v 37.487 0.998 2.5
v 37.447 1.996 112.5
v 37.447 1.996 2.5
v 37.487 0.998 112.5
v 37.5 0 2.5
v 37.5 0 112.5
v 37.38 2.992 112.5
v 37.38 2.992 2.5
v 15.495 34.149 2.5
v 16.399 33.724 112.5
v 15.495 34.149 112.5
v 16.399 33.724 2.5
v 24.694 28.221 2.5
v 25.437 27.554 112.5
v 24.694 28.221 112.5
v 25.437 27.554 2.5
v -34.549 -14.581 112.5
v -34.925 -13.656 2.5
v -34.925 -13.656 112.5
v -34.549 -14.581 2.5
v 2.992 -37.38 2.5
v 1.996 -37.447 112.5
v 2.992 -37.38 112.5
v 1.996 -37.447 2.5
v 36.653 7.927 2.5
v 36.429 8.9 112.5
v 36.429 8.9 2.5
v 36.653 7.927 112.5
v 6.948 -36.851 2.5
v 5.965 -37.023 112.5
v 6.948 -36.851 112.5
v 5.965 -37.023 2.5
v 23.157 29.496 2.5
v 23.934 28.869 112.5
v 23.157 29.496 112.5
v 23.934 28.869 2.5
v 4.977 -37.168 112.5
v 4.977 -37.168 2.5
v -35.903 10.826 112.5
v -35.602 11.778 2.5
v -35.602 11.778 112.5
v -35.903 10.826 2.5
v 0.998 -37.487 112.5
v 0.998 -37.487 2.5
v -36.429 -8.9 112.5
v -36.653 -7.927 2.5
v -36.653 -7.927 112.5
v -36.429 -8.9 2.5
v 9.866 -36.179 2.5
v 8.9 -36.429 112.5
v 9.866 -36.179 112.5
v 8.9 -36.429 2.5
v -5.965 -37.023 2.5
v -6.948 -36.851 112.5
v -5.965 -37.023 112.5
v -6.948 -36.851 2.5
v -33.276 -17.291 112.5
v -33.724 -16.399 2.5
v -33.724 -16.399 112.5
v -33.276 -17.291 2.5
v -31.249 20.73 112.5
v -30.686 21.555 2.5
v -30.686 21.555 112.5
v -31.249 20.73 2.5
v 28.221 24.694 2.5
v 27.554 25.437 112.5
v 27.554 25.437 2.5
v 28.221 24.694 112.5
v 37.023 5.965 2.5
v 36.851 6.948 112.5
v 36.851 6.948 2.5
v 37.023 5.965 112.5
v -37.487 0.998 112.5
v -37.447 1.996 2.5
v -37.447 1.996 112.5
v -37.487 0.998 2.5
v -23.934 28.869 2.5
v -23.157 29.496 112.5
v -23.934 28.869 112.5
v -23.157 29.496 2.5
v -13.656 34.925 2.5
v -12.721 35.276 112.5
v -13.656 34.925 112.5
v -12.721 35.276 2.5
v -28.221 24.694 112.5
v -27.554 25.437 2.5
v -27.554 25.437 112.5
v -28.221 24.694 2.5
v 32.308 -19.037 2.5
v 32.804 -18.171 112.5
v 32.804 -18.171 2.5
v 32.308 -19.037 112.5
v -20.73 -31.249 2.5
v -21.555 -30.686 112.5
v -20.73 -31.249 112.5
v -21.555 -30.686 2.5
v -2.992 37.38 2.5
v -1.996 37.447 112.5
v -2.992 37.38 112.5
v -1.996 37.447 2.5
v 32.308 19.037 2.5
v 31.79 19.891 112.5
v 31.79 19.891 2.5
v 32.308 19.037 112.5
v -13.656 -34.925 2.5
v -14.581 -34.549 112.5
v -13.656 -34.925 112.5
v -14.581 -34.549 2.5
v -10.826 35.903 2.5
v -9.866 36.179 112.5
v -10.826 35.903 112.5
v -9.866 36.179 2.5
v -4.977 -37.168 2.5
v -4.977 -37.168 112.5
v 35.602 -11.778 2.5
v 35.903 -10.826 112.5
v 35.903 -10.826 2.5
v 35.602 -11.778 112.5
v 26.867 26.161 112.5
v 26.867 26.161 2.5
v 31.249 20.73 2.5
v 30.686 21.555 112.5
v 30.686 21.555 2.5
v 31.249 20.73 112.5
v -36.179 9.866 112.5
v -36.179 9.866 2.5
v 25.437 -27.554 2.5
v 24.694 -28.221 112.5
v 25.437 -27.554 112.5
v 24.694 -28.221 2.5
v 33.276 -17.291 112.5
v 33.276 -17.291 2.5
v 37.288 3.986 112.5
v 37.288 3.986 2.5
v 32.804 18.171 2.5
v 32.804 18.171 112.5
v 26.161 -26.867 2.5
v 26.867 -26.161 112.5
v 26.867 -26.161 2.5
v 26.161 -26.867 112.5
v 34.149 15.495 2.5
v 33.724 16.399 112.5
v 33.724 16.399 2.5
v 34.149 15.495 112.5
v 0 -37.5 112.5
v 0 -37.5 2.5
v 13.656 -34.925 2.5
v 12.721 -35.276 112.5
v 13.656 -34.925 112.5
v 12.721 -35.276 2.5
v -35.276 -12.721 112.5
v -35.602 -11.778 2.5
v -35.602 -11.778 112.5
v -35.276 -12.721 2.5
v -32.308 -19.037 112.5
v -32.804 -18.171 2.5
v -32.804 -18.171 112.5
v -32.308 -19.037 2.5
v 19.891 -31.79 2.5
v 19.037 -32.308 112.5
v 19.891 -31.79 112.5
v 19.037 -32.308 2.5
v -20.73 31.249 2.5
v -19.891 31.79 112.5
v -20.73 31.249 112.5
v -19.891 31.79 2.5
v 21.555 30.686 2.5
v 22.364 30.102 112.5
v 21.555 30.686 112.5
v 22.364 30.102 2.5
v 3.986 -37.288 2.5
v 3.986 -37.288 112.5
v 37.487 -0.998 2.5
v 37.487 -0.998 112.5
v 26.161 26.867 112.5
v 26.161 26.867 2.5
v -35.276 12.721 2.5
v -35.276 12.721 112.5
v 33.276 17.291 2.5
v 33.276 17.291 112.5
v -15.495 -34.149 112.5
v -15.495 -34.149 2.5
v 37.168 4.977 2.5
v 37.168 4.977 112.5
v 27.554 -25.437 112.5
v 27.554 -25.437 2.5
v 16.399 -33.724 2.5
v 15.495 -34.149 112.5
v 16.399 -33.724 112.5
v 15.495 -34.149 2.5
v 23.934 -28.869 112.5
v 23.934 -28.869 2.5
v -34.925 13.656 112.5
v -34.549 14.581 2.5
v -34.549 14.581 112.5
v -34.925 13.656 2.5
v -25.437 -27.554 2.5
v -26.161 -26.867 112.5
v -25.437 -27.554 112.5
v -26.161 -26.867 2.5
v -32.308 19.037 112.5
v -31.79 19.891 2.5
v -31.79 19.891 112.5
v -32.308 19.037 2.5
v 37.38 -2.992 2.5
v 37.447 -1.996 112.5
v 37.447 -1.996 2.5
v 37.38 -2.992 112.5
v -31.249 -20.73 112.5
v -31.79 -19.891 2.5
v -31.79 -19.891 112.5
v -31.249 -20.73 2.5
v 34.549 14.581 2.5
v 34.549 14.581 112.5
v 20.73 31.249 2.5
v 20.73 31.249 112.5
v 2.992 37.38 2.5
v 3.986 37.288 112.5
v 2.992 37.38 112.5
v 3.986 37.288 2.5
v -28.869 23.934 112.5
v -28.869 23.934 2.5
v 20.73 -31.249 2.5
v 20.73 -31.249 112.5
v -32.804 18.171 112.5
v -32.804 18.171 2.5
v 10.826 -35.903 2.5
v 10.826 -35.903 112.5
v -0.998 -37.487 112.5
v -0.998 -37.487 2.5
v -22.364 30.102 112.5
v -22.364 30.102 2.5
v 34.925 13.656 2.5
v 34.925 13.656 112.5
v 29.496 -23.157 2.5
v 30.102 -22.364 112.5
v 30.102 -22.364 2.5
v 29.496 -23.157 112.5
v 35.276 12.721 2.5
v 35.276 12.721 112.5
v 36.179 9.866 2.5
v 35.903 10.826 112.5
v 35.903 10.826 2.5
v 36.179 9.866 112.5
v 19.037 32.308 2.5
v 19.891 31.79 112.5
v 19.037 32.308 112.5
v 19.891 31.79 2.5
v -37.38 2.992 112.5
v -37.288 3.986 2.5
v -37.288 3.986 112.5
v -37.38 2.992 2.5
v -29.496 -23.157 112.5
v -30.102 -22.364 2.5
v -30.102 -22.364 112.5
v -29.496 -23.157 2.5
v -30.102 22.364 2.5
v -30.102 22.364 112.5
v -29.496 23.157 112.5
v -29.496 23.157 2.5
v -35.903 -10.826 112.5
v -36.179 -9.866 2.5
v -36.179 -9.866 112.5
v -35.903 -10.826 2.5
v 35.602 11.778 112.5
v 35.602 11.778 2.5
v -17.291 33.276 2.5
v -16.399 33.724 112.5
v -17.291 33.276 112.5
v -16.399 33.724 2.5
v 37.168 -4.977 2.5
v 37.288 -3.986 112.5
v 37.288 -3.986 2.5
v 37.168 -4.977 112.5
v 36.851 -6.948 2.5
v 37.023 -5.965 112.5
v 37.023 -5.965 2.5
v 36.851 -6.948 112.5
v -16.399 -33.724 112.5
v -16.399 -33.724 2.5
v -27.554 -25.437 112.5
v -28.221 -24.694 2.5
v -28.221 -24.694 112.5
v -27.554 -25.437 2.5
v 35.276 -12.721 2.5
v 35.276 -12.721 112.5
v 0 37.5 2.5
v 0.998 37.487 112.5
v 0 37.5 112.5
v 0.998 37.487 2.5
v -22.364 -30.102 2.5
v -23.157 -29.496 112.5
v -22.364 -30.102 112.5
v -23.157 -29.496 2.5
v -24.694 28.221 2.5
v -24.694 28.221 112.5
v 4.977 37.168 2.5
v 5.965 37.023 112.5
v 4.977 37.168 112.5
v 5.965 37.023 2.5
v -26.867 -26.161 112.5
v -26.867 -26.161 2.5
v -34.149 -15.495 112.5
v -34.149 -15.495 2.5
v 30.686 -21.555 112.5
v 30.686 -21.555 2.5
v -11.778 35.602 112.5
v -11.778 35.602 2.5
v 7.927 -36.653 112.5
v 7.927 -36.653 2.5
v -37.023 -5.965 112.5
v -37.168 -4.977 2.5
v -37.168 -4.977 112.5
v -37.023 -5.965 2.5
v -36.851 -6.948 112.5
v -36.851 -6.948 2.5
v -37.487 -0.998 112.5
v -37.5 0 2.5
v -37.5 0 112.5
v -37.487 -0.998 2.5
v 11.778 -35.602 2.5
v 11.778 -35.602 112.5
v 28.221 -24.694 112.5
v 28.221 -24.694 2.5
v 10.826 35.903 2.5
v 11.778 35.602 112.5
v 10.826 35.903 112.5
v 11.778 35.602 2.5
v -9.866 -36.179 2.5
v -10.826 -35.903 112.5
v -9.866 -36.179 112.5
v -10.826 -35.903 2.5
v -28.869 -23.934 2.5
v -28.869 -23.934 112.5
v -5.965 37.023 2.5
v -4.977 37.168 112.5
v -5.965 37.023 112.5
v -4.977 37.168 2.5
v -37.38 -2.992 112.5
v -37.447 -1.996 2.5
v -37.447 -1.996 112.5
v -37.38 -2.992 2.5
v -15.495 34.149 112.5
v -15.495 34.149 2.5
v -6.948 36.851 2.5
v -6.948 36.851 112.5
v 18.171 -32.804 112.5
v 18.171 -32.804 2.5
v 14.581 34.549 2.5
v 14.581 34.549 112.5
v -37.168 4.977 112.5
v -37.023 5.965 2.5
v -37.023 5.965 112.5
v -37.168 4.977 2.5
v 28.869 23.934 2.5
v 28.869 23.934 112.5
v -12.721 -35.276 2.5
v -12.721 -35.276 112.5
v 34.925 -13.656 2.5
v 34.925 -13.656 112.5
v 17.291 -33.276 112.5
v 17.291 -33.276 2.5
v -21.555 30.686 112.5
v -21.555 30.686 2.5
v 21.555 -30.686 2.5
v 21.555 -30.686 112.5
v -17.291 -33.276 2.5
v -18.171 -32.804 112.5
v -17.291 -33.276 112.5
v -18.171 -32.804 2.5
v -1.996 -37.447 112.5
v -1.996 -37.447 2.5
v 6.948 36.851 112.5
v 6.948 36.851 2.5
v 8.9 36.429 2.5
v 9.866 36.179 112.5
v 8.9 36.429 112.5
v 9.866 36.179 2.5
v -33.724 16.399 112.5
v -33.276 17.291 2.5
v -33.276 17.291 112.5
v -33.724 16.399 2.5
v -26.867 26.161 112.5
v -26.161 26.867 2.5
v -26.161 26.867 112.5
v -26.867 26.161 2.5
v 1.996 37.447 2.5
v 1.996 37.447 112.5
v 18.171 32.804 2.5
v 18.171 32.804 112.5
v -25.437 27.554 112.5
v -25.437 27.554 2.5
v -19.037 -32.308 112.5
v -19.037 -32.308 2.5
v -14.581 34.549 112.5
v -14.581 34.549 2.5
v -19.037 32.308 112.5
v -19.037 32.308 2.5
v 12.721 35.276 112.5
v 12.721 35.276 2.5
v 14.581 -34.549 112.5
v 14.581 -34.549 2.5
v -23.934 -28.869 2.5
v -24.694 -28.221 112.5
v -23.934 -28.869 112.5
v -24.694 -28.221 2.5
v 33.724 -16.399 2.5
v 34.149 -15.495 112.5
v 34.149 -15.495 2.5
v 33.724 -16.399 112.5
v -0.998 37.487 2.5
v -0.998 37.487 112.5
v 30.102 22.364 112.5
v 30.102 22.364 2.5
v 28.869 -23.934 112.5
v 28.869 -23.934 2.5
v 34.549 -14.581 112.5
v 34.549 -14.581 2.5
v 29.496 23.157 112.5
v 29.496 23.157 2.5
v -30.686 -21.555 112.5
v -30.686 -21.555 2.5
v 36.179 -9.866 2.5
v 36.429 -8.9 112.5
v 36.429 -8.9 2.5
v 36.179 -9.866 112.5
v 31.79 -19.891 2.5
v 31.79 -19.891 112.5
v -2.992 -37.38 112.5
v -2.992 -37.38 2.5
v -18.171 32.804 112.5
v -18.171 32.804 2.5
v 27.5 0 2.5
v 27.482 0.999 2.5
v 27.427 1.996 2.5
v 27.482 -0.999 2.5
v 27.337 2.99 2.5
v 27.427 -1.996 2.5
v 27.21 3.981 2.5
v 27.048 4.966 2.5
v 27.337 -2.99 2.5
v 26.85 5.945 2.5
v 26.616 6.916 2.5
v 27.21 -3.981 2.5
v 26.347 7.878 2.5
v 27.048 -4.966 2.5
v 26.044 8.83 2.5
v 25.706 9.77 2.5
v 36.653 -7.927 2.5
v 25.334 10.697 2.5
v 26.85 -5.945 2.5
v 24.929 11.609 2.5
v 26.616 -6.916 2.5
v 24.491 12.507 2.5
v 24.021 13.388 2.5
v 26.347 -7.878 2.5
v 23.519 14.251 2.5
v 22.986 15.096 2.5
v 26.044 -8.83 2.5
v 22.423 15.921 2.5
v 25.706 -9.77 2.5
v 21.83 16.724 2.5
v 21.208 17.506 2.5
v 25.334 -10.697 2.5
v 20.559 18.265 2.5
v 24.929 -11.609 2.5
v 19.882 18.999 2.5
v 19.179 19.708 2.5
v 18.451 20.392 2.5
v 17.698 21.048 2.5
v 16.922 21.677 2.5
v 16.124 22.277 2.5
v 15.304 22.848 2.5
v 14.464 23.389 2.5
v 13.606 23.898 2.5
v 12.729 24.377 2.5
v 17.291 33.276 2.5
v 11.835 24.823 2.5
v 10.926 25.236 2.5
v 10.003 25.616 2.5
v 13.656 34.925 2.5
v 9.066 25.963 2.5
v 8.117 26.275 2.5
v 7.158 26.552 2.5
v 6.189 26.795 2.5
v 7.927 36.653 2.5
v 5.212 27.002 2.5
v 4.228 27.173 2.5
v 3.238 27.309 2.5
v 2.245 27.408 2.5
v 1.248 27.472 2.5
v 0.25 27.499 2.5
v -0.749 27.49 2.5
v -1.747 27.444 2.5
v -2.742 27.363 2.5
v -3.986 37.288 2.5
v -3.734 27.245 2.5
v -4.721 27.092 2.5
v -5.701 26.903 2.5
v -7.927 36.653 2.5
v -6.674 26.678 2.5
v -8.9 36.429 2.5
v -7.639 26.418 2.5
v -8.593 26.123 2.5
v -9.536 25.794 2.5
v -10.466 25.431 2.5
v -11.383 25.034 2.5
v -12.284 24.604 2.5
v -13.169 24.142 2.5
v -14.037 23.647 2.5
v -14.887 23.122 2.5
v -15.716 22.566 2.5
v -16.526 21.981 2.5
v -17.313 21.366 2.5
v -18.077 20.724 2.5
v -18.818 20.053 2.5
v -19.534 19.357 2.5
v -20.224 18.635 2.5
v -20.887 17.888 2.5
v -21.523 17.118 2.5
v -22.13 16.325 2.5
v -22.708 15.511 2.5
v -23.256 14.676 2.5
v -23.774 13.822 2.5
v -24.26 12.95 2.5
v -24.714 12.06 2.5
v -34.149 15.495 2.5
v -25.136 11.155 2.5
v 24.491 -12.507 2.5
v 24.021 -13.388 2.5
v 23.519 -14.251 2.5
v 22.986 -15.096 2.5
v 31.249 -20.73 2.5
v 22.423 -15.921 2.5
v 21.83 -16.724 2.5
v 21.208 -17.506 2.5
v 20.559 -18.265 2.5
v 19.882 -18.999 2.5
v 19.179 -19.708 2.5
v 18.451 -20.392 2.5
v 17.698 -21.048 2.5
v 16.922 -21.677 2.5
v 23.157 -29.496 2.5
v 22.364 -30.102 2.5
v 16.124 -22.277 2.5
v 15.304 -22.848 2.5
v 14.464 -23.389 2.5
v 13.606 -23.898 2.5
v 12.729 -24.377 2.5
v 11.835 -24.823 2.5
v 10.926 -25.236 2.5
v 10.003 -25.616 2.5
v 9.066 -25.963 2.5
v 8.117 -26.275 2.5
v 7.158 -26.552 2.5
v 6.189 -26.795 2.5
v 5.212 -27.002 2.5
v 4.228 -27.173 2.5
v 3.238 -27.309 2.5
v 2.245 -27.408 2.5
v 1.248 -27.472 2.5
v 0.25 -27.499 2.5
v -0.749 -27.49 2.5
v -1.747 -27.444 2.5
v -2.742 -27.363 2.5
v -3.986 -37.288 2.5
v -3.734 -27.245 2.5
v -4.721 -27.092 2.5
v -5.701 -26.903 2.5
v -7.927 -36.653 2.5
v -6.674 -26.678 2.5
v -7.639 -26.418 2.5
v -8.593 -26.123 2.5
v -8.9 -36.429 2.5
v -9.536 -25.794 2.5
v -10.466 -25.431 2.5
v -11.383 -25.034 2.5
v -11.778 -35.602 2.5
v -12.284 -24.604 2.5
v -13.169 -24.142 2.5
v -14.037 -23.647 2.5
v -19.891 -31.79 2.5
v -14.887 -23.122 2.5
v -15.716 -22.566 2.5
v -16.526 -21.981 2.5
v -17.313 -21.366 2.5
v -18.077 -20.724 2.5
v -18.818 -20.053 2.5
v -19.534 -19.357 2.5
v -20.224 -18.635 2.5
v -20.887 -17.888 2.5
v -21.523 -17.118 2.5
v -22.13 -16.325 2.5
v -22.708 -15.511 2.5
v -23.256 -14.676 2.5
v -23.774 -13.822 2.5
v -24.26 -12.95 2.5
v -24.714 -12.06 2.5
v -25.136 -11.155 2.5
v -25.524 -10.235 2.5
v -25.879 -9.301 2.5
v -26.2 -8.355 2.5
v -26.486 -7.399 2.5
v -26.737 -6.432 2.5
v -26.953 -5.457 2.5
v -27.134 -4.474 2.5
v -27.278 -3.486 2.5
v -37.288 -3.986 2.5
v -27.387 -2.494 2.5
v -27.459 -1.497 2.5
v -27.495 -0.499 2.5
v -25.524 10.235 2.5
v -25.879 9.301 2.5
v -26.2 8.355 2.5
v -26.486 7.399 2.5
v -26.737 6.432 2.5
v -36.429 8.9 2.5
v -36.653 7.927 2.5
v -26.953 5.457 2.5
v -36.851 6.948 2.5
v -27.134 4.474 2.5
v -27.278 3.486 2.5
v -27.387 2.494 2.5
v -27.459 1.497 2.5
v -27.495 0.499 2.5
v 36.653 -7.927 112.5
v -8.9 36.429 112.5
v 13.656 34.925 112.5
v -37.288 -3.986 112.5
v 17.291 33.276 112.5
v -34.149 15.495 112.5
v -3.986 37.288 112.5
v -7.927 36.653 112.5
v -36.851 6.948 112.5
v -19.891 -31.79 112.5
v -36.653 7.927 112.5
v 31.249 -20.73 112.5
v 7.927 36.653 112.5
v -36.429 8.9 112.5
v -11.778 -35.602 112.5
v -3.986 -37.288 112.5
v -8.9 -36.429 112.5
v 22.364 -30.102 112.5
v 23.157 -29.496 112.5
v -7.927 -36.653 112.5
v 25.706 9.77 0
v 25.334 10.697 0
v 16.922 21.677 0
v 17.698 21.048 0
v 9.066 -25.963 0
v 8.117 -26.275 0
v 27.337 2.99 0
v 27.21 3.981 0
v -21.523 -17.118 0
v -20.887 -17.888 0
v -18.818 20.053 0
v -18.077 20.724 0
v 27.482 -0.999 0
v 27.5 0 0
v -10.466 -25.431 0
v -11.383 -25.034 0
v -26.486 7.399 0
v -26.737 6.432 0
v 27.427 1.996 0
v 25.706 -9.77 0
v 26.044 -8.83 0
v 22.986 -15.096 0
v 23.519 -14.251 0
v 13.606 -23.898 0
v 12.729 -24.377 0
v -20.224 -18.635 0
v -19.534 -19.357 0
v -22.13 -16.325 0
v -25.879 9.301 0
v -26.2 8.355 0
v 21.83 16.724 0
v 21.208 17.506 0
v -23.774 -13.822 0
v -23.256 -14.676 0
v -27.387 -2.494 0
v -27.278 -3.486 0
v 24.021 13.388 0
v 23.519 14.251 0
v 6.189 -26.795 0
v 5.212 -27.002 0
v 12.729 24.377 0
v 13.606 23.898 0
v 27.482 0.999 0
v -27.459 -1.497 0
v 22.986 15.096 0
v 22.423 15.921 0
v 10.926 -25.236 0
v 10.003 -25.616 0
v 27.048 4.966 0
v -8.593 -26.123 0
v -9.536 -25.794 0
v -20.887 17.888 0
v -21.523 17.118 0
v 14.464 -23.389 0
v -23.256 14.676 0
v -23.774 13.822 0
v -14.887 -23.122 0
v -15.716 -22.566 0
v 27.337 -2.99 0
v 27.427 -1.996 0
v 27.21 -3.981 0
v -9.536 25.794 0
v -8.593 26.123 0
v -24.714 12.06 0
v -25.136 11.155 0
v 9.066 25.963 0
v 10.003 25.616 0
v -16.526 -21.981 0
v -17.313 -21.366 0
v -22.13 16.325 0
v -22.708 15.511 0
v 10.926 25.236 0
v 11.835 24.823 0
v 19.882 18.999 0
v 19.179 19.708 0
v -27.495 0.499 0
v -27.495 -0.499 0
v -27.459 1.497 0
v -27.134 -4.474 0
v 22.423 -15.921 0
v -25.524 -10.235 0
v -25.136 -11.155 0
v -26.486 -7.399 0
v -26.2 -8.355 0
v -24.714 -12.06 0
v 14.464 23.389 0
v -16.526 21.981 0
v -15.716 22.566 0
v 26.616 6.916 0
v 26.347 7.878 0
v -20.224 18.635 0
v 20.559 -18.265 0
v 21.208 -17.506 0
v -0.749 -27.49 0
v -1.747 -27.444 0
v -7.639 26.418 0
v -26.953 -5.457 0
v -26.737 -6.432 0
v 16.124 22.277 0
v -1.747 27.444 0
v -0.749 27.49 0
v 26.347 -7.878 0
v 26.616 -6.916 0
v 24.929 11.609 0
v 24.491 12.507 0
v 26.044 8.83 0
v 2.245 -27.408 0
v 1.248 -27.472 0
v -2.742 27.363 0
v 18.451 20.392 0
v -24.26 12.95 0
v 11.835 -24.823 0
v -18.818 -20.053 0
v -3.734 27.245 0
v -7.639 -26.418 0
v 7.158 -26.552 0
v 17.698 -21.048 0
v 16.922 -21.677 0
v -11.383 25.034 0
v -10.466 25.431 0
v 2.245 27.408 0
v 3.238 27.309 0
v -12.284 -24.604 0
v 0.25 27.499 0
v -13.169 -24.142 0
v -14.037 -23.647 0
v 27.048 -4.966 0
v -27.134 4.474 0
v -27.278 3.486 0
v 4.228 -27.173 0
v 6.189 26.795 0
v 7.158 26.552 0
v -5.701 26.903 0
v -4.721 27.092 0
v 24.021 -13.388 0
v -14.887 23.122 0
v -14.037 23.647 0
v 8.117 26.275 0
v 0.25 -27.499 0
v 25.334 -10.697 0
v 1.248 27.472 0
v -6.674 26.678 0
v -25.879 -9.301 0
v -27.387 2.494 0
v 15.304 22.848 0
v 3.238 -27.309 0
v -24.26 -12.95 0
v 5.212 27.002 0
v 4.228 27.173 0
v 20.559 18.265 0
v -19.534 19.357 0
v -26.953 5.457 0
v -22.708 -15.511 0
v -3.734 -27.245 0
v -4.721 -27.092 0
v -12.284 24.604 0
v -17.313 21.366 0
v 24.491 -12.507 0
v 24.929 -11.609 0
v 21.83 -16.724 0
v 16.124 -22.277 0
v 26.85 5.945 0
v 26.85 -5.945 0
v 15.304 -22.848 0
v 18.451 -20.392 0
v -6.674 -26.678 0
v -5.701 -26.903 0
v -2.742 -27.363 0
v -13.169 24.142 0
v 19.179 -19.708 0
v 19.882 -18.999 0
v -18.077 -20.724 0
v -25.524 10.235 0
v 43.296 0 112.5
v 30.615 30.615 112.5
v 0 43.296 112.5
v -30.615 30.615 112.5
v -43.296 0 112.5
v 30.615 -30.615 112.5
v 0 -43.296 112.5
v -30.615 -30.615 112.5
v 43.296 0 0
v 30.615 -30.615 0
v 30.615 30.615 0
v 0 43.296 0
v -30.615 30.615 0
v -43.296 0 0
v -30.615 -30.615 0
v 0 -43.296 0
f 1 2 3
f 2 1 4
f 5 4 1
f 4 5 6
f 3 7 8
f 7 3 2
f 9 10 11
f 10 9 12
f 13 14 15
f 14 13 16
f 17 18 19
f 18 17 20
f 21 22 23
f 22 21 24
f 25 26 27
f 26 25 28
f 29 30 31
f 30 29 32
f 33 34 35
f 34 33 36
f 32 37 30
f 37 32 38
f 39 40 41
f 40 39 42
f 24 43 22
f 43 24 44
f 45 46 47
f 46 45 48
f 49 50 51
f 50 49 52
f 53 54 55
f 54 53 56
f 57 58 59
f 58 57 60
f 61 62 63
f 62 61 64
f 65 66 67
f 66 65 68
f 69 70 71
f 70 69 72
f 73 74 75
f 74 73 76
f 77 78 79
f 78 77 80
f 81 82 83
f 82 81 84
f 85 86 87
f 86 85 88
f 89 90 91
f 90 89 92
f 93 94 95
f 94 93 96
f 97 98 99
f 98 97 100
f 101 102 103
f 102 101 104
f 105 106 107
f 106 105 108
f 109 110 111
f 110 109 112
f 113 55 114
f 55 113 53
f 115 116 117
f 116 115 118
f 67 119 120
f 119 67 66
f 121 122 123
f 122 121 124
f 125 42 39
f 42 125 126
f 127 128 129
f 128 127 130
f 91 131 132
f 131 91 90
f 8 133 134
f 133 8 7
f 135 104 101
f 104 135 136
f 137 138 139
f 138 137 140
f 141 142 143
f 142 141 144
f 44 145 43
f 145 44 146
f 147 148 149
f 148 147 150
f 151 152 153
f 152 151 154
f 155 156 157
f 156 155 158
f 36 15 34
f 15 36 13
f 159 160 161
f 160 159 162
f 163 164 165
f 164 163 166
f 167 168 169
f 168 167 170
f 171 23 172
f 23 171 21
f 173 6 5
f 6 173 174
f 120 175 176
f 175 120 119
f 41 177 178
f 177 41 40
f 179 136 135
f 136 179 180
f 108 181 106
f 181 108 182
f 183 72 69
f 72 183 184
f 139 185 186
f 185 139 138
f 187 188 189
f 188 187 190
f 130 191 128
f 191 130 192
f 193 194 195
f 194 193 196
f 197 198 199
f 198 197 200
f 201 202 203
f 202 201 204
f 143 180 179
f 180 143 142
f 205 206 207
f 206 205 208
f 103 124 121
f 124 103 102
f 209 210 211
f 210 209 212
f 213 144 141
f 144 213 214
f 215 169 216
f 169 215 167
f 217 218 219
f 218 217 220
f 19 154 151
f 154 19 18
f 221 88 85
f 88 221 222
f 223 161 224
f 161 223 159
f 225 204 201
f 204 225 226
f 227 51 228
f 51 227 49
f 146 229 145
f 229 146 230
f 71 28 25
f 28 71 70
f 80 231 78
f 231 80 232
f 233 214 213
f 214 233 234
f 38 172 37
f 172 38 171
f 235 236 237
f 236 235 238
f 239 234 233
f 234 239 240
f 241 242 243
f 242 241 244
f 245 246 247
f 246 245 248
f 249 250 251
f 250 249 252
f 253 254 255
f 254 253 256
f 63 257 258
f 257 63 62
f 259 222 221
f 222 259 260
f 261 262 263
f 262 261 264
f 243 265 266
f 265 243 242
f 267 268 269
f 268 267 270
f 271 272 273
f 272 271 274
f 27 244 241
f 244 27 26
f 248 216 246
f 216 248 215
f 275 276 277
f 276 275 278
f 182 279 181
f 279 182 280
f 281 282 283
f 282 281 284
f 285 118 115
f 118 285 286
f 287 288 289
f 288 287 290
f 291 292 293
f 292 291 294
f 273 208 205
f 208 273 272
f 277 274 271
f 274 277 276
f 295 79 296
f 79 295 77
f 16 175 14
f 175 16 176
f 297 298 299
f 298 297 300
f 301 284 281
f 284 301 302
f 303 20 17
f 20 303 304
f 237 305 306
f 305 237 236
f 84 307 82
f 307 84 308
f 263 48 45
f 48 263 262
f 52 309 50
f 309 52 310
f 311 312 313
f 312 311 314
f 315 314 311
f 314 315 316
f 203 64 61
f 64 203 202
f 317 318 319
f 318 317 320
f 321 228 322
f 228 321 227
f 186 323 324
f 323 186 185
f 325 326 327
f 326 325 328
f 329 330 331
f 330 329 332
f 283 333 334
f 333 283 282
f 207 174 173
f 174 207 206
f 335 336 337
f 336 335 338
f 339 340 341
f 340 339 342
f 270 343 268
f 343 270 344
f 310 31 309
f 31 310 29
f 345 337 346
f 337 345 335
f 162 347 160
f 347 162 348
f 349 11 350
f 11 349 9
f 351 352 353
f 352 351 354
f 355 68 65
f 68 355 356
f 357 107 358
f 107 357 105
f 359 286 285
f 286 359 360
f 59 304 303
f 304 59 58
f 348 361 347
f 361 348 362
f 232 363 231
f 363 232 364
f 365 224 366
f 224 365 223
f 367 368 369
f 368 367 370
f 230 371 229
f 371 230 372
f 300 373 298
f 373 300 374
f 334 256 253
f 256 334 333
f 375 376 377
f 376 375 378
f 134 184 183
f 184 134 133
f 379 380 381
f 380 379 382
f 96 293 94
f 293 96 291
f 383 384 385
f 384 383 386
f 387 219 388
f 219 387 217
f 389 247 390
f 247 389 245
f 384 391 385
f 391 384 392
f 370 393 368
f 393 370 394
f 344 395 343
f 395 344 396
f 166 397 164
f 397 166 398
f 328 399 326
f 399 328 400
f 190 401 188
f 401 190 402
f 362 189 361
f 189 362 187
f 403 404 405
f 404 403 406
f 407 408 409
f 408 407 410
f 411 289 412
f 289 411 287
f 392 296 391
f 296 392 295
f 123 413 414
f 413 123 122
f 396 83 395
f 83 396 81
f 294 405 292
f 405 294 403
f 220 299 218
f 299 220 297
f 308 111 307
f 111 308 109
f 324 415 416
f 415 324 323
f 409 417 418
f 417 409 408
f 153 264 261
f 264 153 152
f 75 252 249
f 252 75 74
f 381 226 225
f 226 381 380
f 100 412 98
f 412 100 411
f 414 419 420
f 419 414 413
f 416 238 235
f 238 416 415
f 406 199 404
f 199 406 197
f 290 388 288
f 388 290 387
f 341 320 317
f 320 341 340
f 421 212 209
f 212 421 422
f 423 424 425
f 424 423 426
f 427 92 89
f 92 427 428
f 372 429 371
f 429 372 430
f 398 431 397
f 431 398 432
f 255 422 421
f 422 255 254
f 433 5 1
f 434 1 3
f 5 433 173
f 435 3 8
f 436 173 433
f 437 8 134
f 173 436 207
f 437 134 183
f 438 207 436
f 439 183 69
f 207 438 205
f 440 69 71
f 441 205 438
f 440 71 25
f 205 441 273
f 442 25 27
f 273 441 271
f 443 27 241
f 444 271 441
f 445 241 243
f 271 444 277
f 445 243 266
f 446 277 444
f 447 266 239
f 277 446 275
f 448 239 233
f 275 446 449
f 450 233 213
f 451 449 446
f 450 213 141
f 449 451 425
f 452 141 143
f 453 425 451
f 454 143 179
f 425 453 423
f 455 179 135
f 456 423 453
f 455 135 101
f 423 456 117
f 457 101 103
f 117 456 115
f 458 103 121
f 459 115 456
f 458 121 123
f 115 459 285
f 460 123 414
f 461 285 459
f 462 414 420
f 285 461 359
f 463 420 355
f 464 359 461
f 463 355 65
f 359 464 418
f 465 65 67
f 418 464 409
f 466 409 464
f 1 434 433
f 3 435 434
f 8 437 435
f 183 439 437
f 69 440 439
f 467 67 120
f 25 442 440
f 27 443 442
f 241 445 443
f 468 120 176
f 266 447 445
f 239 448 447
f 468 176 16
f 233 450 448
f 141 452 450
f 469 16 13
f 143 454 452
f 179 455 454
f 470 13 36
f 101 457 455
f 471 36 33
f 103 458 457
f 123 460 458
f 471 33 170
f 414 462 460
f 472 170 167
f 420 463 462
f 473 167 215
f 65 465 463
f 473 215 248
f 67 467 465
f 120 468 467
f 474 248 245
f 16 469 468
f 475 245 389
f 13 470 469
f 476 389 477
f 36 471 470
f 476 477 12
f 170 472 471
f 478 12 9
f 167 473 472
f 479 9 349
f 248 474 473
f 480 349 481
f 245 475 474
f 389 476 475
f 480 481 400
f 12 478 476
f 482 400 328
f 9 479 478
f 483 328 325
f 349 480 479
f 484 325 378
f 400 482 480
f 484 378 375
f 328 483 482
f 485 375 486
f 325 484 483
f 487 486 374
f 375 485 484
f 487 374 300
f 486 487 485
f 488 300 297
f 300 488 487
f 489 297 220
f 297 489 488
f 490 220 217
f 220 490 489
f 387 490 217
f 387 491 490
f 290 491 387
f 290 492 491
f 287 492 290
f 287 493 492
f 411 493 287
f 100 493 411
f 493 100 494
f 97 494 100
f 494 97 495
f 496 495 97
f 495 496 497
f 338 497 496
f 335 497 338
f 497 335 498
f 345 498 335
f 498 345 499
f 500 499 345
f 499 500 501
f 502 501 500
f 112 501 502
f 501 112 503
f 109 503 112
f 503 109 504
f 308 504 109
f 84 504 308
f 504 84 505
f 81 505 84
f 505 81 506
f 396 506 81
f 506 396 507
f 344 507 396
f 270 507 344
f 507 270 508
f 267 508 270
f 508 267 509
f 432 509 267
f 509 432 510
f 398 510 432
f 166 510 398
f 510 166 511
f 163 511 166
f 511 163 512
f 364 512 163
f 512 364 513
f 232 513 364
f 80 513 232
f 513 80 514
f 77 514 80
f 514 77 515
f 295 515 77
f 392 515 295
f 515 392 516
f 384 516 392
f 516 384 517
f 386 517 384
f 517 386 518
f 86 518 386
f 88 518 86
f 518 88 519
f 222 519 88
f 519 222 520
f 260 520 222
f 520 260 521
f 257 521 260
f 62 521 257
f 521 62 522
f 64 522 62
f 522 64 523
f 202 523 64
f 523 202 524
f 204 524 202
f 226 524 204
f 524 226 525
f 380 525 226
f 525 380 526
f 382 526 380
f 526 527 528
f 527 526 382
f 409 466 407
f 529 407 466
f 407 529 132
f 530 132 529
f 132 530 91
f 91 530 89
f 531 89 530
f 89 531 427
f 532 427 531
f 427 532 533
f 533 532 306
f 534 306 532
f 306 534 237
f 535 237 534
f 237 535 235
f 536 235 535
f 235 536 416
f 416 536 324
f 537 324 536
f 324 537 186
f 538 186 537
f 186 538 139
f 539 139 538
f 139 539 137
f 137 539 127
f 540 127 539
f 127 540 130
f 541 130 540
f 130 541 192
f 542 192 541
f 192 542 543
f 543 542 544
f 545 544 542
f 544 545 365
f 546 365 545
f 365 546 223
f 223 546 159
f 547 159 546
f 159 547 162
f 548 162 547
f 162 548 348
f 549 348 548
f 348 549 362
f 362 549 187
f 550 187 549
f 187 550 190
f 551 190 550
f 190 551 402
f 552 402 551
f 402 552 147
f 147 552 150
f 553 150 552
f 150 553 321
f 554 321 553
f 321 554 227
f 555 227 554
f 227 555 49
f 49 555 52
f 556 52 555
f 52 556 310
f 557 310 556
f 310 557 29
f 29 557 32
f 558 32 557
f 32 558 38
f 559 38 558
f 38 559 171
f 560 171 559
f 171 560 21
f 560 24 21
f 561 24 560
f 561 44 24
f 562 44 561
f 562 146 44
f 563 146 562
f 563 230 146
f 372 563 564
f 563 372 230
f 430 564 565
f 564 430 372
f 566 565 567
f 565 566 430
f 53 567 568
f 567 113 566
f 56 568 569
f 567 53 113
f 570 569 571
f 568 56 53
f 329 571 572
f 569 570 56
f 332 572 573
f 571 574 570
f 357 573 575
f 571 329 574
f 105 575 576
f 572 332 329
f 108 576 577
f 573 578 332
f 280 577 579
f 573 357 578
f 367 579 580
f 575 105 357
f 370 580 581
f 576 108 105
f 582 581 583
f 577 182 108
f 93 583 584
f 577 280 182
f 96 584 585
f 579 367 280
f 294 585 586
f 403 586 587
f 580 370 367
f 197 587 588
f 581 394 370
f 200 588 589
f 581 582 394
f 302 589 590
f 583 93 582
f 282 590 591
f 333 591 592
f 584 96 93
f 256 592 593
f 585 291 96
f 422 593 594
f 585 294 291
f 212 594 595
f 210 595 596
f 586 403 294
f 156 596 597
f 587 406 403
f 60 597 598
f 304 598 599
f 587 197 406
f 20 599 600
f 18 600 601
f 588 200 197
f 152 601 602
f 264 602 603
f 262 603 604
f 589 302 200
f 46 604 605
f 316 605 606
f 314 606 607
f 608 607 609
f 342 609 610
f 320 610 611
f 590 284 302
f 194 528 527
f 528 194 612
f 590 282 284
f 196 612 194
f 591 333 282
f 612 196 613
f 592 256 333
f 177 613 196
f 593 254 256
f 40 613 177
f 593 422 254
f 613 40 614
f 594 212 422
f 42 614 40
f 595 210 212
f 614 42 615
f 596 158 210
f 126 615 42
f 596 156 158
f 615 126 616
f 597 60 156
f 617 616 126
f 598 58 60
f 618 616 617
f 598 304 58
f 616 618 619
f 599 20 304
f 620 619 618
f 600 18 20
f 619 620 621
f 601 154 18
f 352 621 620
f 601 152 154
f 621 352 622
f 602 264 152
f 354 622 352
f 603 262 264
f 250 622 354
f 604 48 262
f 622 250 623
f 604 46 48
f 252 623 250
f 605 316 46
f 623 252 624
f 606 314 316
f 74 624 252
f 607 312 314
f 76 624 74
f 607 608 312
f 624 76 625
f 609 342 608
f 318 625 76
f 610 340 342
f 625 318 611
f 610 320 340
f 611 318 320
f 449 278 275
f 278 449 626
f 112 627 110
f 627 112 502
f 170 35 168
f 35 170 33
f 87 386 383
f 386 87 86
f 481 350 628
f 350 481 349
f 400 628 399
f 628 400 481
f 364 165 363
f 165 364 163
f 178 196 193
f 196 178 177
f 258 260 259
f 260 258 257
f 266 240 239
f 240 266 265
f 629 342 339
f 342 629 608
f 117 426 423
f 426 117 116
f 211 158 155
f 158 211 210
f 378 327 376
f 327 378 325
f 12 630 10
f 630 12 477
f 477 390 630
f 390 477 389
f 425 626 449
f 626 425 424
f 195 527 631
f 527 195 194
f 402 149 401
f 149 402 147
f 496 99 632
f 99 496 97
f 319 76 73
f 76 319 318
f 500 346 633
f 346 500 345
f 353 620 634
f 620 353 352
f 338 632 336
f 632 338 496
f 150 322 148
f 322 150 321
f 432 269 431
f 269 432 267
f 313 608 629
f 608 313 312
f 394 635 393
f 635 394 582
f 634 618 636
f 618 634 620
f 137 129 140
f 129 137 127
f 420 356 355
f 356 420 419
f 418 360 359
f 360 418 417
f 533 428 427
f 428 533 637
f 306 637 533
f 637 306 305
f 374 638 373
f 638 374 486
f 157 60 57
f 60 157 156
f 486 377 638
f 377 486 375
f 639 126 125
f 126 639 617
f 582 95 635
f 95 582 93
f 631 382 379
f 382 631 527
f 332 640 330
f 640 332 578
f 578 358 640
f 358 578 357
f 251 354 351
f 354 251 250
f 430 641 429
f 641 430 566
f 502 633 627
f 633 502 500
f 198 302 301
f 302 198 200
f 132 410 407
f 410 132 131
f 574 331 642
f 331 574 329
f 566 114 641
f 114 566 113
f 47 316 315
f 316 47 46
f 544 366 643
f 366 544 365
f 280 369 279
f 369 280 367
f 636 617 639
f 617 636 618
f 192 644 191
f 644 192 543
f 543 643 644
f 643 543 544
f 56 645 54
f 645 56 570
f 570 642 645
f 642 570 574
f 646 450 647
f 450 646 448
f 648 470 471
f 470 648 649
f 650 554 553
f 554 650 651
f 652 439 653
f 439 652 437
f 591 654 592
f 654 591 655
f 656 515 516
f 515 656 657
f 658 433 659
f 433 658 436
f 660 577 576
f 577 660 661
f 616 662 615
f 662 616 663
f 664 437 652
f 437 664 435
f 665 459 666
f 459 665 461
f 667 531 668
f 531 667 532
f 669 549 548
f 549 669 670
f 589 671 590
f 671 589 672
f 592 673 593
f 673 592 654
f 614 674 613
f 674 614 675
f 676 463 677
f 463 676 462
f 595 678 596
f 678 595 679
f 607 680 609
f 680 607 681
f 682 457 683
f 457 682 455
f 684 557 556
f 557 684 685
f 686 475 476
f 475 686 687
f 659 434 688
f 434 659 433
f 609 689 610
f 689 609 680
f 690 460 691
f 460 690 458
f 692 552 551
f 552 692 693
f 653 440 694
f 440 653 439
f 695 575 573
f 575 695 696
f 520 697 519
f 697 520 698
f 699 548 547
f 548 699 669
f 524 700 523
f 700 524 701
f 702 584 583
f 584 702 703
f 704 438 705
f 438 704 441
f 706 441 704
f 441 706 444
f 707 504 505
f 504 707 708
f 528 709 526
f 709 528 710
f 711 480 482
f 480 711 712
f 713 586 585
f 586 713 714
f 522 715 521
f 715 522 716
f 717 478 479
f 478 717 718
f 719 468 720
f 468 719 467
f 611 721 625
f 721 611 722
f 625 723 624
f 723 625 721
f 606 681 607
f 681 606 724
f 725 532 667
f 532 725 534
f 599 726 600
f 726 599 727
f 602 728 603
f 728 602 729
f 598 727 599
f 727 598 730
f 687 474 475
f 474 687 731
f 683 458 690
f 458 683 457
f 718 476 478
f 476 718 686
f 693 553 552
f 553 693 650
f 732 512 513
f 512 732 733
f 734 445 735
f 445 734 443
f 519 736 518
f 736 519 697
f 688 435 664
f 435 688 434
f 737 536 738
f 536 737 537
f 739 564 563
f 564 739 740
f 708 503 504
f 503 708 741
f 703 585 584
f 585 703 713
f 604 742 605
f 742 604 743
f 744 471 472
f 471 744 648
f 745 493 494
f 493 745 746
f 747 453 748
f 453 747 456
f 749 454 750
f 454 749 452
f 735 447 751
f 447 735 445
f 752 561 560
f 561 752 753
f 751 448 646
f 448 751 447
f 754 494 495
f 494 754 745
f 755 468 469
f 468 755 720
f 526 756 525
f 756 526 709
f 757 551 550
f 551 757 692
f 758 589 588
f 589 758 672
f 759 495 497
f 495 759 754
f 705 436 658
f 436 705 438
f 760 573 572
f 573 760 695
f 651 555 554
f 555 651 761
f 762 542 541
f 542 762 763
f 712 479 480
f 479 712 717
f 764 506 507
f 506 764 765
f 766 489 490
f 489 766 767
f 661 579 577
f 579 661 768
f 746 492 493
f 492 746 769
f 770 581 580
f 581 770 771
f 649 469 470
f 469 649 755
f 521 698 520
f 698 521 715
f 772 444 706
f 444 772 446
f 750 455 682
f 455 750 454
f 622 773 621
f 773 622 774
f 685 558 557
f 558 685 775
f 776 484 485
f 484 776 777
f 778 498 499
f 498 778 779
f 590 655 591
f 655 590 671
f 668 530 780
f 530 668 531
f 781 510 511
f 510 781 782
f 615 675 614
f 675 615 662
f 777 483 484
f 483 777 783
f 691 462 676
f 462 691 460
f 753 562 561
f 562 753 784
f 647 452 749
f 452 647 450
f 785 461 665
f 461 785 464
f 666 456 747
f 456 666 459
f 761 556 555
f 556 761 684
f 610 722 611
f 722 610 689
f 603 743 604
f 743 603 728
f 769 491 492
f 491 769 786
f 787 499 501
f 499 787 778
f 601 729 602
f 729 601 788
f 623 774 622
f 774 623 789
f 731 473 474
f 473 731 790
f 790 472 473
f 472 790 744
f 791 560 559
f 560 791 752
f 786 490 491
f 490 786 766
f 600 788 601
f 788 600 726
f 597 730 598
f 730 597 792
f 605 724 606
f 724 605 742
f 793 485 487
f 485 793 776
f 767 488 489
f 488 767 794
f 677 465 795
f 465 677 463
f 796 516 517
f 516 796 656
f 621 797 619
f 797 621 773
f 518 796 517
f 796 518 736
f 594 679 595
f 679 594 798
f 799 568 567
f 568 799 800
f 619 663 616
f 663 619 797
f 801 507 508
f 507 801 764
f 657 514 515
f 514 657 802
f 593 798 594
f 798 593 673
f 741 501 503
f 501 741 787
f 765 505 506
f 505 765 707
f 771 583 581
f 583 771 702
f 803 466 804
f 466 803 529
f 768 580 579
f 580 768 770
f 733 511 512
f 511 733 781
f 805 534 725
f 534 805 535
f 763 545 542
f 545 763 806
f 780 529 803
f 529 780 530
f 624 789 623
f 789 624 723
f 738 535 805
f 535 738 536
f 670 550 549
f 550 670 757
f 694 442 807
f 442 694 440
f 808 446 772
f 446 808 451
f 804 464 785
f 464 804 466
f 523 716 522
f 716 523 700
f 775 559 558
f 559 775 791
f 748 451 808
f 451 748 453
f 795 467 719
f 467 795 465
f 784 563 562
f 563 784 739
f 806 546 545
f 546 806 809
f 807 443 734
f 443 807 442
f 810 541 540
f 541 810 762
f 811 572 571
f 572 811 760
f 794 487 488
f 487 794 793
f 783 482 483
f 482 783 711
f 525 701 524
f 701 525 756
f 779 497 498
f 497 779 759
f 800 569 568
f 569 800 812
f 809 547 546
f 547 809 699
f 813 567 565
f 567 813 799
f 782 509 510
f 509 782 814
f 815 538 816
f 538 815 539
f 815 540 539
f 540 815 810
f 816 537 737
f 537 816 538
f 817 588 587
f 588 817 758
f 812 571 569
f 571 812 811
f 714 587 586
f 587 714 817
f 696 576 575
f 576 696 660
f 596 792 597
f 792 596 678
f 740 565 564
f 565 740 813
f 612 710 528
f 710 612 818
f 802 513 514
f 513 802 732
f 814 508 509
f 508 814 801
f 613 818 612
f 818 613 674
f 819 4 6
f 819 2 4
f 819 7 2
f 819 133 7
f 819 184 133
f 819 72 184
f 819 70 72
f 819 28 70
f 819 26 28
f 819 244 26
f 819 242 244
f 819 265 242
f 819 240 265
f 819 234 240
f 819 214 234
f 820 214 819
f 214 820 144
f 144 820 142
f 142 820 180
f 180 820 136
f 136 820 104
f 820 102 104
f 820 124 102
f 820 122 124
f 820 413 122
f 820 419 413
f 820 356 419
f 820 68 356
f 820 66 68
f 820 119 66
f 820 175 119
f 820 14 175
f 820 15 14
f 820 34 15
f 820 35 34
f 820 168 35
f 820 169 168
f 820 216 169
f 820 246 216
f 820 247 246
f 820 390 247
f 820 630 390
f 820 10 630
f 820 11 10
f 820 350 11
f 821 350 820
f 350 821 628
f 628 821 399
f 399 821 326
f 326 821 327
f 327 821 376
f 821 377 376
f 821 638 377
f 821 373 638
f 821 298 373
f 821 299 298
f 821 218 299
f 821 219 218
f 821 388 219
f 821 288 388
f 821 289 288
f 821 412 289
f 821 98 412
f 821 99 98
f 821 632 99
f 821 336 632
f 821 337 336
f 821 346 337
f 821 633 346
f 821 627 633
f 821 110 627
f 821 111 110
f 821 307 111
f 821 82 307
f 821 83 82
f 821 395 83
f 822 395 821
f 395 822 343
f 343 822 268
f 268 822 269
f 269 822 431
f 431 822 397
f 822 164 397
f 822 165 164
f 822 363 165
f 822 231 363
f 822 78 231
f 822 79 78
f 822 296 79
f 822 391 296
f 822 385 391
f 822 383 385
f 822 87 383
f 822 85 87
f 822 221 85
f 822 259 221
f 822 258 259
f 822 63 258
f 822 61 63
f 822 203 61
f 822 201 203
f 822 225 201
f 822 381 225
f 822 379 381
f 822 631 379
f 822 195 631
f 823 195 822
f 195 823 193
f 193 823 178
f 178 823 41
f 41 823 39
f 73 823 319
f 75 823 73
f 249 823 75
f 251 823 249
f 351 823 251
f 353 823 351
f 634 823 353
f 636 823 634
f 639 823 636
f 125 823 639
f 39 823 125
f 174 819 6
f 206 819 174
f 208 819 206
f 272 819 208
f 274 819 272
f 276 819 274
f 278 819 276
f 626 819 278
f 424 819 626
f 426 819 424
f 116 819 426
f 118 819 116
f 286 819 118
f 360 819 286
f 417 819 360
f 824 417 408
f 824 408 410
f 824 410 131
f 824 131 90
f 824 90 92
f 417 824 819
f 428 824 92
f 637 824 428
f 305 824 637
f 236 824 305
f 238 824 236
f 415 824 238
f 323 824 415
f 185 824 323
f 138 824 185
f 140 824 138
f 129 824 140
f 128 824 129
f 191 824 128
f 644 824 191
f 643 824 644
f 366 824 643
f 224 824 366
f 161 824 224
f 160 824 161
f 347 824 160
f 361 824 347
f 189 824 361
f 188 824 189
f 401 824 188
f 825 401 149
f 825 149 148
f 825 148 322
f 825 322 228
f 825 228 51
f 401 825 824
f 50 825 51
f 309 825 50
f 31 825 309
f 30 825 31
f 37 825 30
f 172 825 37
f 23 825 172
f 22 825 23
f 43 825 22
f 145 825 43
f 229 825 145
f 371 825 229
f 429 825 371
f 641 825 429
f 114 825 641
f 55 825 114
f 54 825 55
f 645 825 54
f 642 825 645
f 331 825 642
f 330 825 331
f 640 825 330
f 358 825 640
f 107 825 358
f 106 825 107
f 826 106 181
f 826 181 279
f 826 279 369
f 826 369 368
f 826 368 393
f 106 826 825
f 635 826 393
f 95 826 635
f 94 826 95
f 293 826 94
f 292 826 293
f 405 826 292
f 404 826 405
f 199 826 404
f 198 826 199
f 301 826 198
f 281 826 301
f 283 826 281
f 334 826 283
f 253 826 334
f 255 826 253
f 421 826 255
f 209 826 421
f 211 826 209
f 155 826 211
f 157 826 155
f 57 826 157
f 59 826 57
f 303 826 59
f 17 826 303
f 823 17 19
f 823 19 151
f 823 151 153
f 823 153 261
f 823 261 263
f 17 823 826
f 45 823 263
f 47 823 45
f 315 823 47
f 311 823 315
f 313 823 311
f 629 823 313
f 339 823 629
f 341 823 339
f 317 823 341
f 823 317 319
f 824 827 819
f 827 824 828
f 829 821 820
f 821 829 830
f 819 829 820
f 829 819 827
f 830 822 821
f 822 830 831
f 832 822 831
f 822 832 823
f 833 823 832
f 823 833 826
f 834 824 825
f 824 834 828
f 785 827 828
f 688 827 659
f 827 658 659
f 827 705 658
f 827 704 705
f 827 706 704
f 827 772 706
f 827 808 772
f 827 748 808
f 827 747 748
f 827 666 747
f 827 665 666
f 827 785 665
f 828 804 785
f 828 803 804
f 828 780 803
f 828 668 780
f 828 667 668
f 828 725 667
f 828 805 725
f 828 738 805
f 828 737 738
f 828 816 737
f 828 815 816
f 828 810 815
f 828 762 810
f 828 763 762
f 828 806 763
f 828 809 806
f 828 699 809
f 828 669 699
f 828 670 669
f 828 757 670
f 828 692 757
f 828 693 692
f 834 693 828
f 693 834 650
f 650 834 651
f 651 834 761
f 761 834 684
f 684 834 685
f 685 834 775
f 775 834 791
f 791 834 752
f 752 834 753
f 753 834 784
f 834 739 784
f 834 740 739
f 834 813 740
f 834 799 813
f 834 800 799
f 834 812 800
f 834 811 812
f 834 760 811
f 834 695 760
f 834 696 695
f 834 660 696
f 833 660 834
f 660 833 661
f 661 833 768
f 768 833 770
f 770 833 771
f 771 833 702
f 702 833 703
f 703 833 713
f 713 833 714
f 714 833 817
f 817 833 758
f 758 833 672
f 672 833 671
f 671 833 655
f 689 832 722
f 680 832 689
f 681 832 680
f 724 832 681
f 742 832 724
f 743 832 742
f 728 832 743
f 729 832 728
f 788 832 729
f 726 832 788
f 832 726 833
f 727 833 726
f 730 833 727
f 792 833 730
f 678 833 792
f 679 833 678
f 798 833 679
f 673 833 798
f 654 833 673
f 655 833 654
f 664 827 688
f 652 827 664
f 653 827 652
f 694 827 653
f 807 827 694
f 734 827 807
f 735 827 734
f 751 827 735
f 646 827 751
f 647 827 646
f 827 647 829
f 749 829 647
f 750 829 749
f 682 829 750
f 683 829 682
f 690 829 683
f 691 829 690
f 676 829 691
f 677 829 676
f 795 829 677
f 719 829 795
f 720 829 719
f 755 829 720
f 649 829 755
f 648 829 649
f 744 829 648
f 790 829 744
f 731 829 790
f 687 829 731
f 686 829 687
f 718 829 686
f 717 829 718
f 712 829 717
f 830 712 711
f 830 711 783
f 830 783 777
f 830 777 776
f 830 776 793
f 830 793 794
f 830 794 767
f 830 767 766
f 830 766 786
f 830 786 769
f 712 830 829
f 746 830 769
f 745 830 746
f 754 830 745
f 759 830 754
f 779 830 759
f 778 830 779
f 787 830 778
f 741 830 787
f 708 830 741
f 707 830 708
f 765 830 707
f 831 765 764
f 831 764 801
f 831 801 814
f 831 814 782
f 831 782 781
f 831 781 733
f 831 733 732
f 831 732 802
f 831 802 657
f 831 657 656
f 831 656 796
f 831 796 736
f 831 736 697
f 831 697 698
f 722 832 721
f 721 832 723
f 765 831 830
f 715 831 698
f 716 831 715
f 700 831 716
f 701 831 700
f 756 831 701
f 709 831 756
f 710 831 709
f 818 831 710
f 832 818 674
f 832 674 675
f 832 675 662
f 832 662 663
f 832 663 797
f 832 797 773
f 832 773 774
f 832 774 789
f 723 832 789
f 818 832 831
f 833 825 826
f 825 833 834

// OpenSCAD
// file: ../lib/project/cache_pot_geometry.scad
// Shared paneled cache pot geometry helpers.

function cache_pot_outside_height(inside_height, bottom_thickness) =
  inside_height + bottom_thickness;

function cache_pot_outside_radius(inside_radius, min_wall_thickness, num_panels) =
  (inside_radius + min_wall_thickness) / cos(180 / num_panels);

function cache_pot_panel_extra_radius(panel_thickness, num_panels) =
  panel_thickness / cos(180 / num_panels);

function cache_pot_panel_width(outside_radius, panel_thickness, num_panels) =
  (outside_radius + cache_pot_panel_extra_radius(panel_thickness, num_panels)) *
  2 * sin(180 / num_panels);

module cache_pot_outside_cylinder(outside_height, outside_radius, num_panels) {
  cylinder(outside_height, outside_radius, outside_radius, $fn = num_panels);
}

module cache_pot_inside_cutout(
  inside_height,
  inside_radius,
  bottom_thickness,
  bottom_edge_width
) {
  translate([0, 0, bottom_thickness])
    cylinder(inside_height + 1, inside_radius, inside_radius);
  translate([0, 0, -0.5 * bottom_thickness])
    cylinder(
      2 * bottom_thickness,
      inside_radius - bottom_edge_width,
      inside_radius - bottom_edge_width
    );
}

module cache_pot_core(
  inside_height,
  inside_radius,
  bottom_thickness,
  bottom_edge_width,
  outside_height,
  outside_radius,
  num_panels
) {
  difference() {
    cache_pot_outside_cylinder(outside_height, outside_radius, num_panels);
    cache_pot_inside_cutout(
      inside_height,
      inside_radius,
      bottom_thickness,
      bottom_edge_width
    );
  }
}

module cache_pot_panel_shell(
  outside_height,
  outside_radius,
  panel_thickness,
  num_panels
) {
  difference() {
    cylinder(
      outside_height,
      outside_radius + panel_thickness,
      outside_radius + panel_thickness,
      $fn = num_panels
    );
    translate([0, 0, -1])
      cylinder(outside_height + 2, outside_radius, outside_radius, $fn = num_panels);
    translate([-(outside_radius + panel_thickness + 1), 0, -1])
      cube([
        2 * (outside_radius + panel_thickness + 1),
        2 * (outside_radius + panel_thickness + 1),
        outside_height + 2
      ]);
    rotate([0, 0, 180 - 360 / num_panels])
      translate([-(outside_radius + panel_thickness + 1), 0, -1])
        cube([
          2 * (outside_radius + panel_thickness + 1),
          2 * (outside_radius + panel_thickness + 1),
          outside_height + 2
        ]);
  }
}

module cache_pot_panel_flat_on_bed(
  inside_radius,
  min_wall_thickness,
  outside_height,
  num_panels,
  outside_radius,
  panel_thickness
) {
  translate([outside_height / 2, 0, -(inside_radius + min_wall_thickness)])
    rotate([0, -90, 0])
      rotate([0, 0, 180 / num_panels])
        cache_pot_panel_shell(
          outside_height = outside_height,
          outside_radius = outside_radius,
          panel_thickness = panel_thickness,
          num_panels = num_panels
        );
}
// main file
// Paneled cache pot core.

use <../lib/project/cache_pot_geometry.scad>;

// ---------- Public parameters (mm) ----------
inside_radius = 75 / 2;
inside_height = 110;
min_wall_thickness = 2.5;
bottom_thickness = 2.5;
bottom_edge_width = 10;
num_panels = 8;
panel_thickness = 2.5;

// ---------- Resolution ----------
$fa = 1;
$fs = 1;

// ---------- Derived ----------
outside_height = cache_pot_outside_height(inside_height, bottom_thickness);
outside_radius = cache_pot_outside_radius(inside_radius, min_wall_thickness, num_panels);

//color("blue") panel_flat_on_bed();
//color("red") panel();
color("yellow")
  cache_pot_core(
    inside_height = inside_height,
    inside_radius = inside_radius,
    bottom_thickness = bottom_thickness,
    bottom_edge_width = bottom_edge_width,
    outside_height = outside_height,
    outside_radius = outside_radius,
    num_panels = num_panels
  );
